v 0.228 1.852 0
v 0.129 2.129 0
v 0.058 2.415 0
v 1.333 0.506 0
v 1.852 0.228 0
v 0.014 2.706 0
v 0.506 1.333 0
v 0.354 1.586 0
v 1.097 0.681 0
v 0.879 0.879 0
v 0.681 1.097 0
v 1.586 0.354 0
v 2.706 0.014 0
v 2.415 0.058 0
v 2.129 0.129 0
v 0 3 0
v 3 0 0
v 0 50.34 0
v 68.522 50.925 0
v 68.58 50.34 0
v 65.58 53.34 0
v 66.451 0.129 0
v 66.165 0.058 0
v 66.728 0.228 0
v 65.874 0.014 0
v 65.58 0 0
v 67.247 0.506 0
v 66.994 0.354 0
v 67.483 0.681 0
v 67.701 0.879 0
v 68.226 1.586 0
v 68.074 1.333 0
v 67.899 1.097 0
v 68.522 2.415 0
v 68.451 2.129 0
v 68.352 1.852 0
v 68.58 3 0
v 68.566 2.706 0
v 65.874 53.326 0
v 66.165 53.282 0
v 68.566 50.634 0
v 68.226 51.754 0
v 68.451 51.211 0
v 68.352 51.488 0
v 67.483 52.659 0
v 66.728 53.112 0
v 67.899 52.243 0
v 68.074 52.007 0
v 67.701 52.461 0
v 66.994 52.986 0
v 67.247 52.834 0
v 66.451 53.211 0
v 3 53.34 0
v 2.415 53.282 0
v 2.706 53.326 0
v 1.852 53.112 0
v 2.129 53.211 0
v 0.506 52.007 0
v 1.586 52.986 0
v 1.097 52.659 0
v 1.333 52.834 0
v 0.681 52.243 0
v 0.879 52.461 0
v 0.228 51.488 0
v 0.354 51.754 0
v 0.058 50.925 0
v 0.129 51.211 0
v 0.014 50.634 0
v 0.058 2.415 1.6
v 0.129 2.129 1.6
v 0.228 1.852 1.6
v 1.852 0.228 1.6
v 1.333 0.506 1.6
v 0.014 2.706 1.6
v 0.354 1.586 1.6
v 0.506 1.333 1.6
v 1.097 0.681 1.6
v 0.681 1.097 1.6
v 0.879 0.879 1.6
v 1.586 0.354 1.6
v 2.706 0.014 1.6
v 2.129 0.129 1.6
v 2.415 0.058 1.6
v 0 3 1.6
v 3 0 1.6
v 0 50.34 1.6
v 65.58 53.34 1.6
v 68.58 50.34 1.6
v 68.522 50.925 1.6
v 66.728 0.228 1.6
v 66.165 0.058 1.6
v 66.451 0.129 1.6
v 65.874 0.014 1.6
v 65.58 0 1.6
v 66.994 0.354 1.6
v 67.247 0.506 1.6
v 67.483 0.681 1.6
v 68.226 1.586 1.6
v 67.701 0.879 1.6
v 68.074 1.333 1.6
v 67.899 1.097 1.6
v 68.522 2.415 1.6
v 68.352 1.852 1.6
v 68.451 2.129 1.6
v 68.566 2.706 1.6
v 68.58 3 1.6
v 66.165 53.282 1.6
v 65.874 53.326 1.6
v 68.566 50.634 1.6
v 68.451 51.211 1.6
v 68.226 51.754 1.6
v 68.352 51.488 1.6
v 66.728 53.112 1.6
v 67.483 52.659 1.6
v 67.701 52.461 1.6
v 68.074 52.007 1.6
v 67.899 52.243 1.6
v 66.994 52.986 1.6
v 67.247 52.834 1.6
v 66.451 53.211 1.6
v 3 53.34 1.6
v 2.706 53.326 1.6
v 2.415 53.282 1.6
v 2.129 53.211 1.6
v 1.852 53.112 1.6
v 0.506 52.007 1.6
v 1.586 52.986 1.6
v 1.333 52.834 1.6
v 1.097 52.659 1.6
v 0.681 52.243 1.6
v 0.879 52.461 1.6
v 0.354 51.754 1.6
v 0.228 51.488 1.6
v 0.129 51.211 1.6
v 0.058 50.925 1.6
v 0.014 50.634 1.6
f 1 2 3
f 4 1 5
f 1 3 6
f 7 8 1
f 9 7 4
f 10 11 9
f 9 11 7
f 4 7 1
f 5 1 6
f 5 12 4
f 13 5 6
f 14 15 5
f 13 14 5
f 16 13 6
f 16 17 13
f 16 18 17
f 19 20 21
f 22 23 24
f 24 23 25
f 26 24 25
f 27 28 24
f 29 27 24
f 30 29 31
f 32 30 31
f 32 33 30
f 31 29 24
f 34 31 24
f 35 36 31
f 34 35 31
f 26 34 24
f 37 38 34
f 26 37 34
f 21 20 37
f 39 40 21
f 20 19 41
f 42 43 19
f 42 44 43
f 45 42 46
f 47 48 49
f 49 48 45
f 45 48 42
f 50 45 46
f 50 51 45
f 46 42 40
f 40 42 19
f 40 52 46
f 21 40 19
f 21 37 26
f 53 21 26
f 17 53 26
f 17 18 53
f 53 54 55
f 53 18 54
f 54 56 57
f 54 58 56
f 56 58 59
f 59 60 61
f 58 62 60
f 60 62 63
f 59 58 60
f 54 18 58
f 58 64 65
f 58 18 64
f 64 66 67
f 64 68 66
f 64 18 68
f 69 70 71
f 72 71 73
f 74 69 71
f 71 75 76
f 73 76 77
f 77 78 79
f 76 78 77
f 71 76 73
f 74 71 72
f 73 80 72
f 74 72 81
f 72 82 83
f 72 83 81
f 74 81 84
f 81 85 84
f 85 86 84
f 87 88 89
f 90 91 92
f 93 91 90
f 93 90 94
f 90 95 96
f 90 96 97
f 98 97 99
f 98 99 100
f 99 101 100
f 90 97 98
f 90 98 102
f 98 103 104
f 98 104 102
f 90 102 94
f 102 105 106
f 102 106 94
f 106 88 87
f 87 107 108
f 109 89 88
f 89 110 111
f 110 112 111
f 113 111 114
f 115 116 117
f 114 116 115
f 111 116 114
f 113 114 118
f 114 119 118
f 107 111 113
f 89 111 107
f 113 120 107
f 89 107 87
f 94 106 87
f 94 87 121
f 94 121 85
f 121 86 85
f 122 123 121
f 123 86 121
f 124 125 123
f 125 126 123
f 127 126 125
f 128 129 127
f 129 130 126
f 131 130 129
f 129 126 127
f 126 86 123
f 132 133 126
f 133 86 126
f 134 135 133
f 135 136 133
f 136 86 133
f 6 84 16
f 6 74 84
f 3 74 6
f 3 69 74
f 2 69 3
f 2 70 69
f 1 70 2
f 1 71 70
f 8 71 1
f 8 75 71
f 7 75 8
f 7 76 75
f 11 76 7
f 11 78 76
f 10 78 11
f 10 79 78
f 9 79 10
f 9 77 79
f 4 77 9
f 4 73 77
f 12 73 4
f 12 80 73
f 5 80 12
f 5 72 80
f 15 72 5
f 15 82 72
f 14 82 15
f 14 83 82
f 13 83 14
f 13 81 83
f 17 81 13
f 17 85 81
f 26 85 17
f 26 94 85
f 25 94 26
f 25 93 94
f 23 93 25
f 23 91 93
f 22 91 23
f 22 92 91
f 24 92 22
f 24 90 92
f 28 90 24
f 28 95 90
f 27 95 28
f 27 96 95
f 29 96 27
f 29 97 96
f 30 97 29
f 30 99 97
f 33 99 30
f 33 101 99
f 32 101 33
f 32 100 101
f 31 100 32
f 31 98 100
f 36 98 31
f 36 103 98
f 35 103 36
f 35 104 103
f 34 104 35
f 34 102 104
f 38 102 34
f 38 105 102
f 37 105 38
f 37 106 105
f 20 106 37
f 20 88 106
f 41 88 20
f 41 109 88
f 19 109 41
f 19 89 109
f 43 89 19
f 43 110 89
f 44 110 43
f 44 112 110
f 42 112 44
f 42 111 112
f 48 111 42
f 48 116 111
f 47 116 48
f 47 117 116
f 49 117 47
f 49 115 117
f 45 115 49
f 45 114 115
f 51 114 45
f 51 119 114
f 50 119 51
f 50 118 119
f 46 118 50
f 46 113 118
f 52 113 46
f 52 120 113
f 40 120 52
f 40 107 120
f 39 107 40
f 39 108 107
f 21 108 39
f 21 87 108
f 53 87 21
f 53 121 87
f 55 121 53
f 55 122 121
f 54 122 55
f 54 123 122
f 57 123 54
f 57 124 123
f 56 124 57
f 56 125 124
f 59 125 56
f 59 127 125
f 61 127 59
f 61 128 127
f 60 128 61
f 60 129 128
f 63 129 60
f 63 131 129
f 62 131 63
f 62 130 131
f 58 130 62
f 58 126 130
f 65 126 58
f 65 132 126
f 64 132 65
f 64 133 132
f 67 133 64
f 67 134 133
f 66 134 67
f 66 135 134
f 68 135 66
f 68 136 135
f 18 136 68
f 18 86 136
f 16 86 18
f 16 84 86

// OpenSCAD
$fn = 64;

board_len = 68.58;
board_wid = 53.34;
board_thk = 1.6;

corner_r = 3.0;

module rounded_rect_2d(l, w, r) {
    r2 = min(r, min(l, w)/2);
    hull() {
        translate([ r2,      r2     ]) circle(r=r2);
        translate([ l - r2,  r2     ]) circle(r=r2);
        translate([ r2,      w - r2 ]) circle(r=r2);
        translate([ l - r2,  w - r2 ]) circle(r=r2);
    }
}

linear_extrude(height=board_thk)
    rounded_rect_2d(board_len, board_wid, corner_r);
